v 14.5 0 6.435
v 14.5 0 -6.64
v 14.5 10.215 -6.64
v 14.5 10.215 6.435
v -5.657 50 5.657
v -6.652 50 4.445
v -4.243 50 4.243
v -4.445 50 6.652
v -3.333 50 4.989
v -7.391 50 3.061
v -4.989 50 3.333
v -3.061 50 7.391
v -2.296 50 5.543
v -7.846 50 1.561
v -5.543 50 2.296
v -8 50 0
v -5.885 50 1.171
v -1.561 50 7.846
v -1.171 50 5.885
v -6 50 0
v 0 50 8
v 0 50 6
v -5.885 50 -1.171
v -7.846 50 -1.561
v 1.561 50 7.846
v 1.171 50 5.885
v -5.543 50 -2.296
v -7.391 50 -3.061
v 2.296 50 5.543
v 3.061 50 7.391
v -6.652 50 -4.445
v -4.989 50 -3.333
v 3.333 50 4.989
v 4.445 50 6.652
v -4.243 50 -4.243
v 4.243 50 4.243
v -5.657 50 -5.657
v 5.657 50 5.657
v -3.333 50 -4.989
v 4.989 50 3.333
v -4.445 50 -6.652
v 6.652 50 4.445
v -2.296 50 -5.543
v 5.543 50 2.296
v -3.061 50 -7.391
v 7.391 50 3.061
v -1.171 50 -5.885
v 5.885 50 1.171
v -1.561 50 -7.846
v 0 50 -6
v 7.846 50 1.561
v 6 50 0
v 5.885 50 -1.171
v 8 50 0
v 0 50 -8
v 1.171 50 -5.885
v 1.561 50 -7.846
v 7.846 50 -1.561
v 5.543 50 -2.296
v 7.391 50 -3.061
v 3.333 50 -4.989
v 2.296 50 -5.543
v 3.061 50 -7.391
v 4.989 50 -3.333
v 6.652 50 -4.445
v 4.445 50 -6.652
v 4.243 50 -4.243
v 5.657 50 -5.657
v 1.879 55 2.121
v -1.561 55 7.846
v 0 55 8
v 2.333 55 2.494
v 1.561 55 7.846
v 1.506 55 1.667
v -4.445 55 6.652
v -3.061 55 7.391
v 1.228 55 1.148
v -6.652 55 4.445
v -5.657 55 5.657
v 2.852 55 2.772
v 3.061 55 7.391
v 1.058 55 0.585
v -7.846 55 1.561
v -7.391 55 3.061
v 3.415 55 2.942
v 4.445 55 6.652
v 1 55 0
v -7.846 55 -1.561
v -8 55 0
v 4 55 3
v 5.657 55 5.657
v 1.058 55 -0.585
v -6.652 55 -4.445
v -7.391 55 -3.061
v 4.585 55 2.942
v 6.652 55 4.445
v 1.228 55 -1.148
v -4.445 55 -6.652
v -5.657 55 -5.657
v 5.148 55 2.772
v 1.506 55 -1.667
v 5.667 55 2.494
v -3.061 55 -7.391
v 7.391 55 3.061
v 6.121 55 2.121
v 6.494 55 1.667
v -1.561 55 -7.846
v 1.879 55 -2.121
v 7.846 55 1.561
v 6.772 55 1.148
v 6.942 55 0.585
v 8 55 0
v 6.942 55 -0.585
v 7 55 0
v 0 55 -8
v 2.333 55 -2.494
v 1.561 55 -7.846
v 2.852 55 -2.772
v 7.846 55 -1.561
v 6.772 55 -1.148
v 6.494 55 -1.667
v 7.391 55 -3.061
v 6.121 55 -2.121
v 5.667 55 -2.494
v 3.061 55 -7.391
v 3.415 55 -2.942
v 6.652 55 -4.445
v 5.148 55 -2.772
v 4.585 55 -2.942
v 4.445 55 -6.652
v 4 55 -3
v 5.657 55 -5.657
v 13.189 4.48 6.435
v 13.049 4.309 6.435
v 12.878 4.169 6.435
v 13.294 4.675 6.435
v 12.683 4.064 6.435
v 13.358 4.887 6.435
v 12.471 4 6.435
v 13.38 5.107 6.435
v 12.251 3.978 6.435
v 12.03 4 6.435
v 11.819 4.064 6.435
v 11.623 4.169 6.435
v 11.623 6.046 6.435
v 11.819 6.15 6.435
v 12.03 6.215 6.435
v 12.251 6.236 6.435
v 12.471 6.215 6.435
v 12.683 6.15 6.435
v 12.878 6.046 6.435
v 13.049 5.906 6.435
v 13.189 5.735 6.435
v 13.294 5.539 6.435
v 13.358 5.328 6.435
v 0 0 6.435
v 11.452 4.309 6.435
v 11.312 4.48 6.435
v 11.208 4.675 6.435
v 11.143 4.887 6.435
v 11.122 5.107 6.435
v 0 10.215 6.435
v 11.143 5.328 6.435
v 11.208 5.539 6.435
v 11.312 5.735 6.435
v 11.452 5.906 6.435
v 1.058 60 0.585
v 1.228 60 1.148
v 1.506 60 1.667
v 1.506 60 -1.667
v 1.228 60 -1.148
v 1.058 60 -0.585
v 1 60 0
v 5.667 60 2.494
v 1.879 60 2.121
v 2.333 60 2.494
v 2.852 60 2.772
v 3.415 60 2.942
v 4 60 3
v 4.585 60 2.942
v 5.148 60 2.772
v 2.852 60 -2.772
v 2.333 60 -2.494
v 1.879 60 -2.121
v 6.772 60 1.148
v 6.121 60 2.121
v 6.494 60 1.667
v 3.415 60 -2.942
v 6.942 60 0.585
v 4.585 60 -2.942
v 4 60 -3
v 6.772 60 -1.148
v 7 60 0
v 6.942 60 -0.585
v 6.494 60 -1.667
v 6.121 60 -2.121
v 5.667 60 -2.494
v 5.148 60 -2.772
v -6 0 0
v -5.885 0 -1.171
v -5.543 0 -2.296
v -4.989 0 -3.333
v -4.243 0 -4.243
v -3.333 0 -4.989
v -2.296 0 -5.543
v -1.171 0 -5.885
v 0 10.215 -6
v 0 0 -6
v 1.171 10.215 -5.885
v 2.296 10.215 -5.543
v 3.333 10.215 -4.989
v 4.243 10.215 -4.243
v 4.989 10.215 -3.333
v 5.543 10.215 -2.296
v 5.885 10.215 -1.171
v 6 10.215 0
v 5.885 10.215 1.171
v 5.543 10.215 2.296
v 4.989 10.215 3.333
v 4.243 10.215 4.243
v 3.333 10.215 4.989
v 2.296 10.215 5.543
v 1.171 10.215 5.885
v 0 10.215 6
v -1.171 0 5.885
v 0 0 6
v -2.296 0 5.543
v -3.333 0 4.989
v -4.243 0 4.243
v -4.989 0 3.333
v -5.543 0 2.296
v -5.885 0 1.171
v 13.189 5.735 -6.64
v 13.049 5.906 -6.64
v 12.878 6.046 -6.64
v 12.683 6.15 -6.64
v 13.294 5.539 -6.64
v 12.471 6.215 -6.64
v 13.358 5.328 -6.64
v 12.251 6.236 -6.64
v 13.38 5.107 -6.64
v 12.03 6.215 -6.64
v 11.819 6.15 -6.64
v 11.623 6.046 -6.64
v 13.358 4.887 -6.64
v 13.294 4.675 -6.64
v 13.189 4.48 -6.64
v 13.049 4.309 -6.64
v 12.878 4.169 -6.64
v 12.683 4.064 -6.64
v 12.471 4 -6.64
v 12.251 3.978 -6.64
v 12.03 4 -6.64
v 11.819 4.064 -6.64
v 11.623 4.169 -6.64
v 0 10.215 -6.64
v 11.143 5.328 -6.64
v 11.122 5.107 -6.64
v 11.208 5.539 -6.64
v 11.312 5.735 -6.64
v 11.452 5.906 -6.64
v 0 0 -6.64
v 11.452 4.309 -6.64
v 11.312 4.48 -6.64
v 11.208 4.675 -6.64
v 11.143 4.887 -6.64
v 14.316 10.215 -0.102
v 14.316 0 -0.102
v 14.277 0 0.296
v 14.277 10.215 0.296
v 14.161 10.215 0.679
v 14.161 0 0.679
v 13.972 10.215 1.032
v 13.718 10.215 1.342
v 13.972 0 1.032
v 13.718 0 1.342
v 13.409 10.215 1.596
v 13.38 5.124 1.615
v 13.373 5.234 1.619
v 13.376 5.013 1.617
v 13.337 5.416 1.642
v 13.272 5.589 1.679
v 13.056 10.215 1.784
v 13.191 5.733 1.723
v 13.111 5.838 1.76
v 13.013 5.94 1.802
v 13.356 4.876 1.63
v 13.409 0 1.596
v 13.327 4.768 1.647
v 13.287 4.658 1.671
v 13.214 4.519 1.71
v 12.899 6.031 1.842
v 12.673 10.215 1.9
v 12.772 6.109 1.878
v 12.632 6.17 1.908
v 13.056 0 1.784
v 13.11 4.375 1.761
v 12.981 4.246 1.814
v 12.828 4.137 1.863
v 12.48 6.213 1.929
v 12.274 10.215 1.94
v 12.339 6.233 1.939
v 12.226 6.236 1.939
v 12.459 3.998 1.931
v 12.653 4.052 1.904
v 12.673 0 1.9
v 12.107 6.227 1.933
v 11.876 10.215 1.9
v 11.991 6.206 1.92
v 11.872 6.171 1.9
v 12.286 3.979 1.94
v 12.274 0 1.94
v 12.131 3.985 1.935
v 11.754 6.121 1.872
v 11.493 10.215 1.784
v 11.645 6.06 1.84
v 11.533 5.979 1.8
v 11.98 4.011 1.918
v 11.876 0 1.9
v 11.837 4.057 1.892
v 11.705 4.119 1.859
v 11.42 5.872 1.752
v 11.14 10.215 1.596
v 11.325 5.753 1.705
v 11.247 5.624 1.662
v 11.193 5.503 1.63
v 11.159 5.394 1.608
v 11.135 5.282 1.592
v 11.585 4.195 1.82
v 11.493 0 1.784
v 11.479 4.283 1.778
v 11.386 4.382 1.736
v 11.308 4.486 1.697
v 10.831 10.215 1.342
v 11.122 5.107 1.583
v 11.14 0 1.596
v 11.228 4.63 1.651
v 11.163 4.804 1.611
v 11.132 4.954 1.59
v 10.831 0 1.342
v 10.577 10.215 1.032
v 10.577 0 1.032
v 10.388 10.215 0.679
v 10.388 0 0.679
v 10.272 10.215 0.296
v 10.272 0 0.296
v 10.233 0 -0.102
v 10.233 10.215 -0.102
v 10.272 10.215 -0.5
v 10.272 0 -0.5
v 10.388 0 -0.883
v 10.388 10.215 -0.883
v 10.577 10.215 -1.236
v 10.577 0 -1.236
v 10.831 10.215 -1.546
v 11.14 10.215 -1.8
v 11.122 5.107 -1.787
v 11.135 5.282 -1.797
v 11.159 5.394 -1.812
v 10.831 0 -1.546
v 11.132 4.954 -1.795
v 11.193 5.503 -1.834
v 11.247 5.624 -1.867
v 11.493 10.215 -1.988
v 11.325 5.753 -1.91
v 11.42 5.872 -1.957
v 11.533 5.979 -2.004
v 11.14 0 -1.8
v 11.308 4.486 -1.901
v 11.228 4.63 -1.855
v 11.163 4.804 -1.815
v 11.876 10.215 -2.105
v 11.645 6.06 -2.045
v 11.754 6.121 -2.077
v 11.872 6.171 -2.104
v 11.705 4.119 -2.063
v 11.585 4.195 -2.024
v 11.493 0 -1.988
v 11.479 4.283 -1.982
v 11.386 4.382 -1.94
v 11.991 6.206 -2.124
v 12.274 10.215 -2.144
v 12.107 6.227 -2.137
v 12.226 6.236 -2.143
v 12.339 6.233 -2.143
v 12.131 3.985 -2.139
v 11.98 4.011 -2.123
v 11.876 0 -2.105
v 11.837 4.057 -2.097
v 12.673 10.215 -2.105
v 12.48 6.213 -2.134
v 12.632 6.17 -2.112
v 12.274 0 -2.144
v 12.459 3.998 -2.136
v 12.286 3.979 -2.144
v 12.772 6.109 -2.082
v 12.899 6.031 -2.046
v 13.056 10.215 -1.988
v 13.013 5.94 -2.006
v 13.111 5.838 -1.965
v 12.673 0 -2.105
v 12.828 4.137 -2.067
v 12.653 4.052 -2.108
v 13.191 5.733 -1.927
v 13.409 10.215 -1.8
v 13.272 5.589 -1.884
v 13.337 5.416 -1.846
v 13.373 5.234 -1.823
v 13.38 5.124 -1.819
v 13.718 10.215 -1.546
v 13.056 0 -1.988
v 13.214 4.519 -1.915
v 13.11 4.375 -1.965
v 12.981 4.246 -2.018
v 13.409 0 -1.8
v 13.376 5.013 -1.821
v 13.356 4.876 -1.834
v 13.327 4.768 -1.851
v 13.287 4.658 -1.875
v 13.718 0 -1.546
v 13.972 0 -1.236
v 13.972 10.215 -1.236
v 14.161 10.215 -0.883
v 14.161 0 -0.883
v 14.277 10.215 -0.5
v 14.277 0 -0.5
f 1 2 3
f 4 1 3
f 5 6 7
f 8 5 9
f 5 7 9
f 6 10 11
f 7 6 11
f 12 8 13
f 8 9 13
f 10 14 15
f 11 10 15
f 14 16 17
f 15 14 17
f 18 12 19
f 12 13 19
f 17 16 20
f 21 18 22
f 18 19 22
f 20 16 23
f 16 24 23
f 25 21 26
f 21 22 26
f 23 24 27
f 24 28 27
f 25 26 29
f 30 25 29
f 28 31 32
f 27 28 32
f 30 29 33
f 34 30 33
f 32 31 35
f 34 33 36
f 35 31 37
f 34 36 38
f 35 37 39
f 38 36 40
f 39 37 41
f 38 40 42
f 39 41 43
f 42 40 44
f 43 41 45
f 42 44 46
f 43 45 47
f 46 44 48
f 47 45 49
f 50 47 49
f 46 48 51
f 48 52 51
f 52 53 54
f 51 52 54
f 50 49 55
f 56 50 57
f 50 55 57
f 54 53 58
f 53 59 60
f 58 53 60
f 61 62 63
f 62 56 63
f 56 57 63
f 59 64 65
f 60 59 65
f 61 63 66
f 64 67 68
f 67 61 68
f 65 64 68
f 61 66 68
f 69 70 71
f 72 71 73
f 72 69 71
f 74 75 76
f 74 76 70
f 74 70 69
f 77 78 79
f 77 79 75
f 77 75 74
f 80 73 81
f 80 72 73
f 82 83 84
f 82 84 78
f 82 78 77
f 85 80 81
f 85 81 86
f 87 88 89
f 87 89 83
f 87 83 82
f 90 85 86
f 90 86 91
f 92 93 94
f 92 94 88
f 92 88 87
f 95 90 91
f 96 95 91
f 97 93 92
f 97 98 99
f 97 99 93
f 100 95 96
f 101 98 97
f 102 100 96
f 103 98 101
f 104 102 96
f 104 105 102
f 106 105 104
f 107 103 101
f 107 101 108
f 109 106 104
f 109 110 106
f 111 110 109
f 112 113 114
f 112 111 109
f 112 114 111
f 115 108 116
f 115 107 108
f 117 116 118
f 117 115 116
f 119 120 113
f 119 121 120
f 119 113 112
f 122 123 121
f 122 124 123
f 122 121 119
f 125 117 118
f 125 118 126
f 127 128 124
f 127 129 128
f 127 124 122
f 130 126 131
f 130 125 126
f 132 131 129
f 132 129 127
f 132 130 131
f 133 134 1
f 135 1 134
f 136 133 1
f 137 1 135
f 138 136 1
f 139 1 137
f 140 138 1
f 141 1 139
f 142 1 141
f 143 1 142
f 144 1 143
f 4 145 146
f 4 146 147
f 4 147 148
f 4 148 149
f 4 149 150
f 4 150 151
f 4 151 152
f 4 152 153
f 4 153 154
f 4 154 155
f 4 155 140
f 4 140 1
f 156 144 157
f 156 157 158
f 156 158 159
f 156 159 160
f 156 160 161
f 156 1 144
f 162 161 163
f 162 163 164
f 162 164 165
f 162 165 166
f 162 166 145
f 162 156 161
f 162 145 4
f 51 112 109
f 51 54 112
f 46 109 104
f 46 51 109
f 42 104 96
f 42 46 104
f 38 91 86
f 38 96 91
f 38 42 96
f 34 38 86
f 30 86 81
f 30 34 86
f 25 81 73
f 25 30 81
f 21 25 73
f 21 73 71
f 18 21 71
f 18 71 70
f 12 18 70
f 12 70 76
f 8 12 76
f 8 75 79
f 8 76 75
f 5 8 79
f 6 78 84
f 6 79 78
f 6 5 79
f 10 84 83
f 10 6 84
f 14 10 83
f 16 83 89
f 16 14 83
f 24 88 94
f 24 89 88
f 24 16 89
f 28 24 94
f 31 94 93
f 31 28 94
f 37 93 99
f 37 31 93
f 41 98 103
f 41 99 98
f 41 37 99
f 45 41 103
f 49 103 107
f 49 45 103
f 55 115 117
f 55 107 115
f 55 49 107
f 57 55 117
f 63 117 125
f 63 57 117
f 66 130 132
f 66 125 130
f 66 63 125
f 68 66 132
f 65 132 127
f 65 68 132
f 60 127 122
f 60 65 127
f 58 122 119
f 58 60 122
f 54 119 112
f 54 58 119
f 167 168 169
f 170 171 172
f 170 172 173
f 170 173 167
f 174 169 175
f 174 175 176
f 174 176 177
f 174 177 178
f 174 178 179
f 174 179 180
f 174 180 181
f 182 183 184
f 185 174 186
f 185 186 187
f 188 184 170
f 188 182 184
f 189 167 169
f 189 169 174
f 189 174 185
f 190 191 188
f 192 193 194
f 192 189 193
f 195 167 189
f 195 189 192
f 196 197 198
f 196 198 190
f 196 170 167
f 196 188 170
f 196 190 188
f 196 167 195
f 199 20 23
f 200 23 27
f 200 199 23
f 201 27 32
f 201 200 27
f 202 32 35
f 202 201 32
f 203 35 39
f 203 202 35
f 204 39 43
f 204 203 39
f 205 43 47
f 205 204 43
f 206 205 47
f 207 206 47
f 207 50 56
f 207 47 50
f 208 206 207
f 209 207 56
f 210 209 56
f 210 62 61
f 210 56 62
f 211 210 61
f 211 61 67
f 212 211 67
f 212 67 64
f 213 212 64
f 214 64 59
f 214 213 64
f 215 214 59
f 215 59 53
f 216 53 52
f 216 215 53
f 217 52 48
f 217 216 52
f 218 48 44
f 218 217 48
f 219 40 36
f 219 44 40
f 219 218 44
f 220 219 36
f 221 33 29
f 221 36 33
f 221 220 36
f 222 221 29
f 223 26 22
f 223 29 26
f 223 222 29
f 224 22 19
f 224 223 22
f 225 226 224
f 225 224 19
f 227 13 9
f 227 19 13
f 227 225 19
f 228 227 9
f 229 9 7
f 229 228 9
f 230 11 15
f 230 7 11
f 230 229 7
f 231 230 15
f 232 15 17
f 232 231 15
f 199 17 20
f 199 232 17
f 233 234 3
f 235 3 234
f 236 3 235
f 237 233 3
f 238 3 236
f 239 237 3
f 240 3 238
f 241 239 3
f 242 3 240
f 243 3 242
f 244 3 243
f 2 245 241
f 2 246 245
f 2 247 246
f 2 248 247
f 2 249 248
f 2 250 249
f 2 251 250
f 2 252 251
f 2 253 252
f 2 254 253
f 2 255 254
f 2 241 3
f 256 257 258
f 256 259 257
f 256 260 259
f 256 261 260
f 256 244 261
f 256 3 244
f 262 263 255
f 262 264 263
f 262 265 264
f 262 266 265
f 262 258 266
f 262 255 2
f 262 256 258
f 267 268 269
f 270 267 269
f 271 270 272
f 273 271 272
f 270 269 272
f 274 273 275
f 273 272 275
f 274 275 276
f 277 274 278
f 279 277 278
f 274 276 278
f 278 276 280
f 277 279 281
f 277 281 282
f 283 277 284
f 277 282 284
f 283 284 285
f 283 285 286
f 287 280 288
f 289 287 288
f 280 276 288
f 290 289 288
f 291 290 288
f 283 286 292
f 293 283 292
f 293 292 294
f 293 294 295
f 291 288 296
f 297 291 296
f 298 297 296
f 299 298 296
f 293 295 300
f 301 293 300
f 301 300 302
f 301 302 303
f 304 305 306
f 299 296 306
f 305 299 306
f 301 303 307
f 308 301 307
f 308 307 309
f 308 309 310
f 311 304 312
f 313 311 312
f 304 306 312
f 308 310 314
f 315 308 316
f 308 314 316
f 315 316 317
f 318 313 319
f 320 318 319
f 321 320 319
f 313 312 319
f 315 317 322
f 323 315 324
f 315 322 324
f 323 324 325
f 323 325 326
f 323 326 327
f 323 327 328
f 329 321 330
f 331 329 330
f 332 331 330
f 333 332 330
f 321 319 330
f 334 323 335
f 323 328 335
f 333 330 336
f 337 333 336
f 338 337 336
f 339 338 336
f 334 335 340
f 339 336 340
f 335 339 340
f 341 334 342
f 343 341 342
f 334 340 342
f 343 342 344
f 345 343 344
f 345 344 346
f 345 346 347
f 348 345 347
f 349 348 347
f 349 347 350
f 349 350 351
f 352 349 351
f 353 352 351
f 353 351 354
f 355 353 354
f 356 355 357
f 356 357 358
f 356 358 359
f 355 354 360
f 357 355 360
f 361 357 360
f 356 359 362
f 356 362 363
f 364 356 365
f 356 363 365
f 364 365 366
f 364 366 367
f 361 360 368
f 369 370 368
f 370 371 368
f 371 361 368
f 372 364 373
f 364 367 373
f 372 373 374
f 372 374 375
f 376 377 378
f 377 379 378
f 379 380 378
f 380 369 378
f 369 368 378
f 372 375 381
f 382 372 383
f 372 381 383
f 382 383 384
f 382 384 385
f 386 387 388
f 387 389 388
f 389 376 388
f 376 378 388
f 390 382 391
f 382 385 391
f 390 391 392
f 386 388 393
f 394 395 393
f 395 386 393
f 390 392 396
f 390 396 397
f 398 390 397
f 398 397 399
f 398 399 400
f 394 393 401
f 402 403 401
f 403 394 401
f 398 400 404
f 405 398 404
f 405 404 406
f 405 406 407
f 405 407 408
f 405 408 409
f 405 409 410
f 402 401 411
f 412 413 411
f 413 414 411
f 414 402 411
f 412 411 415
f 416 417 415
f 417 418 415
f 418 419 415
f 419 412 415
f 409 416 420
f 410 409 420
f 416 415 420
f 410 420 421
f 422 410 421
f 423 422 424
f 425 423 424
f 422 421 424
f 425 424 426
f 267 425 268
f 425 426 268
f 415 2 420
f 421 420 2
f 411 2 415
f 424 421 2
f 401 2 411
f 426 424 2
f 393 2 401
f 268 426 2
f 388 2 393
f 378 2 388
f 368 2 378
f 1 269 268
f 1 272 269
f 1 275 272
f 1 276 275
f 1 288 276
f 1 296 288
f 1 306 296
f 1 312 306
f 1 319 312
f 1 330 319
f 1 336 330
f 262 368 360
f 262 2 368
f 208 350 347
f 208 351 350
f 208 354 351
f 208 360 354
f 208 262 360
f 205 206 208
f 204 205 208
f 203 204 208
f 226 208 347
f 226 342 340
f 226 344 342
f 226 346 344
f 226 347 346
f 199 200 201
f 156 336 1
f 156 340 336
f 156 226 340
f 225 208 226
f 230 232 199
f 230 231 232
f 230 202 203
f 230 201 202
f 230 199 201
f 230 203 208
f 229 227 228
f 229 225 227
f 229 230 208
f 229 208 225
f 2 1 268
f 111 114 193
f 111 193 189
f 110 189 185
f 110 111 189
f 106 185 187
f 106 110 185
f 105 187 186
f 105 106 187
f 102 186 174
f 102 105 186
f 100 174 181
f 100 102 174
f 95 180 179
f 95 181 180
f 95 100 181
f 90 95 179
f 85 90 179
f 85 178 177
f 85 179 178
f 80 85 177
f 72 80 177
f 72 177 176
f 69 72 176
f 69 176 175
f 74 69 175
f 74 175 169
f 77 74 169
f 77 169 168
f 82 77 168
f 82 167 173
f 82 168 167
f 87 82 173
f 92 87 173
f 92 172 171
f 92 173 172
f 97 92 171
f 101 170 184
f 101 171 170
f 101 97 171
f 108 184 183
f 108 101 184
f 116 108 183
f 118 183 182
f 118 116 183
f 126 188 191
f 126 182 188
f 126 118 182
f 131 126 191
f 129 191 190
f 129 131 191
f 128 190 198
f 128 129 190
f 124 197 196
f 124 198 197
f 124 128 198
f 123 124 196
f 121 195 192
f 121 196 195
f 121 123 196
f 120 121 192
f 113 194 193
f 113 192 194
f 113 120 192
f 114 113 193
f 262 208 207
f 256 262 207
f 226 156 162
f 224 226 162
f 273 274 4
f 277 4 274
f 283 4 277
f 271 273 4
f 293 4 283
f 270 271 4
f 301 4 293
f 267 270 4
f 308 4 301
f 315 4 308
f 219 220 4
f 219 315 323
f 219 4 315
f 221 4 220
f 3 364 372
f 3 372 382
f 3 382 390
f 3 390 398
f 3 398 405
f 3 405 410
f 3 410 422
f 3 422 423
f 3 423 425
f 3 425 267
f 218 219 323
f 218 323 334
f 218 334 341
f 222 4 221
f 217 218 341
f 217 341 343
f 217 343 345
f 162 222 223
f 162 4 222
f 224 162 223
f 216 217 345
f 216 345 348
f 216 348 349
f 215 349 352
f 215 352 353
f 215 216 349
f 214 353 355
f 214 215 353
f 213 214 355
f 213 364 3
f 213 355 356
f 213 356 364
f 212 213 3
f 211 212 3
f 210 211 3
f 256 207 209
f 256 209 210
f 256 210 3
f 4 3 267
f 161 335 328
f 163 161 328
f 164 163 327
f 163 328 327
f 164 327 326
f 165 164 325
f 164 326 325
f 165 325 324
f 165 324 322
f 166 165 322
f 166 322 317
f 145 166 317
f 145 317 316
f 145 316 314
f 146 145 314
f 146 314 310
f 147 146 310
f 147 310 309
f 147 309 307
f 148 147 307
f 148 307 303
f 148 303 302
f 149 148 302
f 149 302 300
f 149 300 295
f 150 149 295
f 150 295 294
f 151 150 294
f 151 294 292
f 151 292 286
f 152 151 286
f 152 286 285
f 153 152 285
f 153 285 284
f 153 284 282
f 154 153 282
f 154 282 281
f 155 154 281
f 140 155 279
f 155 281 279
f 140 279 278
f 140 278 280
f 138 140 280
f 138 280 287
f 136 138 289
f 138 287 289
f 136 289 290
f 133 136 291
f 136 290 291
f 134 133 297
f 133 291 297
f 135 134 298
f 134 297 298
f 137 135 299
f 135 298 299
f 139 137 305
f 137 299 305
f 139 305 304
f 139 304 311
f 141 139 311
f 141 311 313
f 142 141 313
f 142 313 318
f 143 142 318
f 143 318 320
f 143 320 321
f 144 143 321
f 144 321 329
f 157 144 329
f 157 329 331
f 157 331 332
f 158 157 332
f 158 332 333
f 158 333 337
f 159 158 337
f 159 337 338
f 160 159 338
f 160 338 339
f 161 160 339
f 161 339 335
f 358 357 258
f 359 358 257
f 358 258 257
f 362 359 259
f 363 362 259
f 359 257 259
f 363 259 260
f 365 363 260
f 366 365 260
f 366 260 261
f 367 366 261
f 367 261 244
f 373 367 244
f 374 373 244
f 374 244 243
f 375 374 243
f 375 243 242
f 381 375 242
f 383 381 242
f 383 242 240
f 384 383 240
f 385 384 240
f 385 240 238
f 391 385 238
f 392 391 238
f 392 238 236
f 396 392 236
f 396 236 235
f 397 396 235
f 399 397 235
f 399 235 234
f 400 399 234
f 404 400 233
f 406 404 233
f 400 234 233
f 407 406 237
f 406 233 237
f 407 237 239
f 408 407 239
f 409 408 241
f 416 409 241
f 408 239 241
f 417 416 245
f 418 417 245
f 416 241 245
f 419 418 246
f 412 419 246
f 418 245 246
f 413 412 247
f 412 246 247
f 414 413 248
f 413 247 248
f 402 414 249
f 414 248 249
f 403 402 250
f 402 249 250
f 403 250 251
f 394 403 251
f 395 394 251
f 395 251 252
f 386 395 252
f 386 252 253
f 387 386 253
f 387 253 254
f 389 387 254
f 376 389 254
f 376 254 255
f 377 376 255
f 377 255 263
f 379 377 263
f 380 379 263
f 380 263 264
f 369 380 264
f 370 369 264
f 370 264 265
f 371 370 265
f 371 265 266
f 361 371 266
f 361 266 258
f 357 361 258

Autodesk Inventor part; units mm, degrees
ref_plane "YZ Plane" through (0, 0, 0) normal (1, 0, 0) x (0, 1, 0)
ref_plane "XZ Plane" through (0, 0, 0) normal (0, 1, 0) x (-1, 0, 0)
ref_plane "XY Plane" through (0, 0, 0) normal (0, 0, 1) x (1, 0, 0)
sketch "Эскиз1" plane through (0, 0, 0) normal (0, 1, 0) x (-1, 0, 0)
  circle A0 centre (0, 0) radius 6
  dimension "d0" = 12
extrude "Выдавливание1" add sketch "Эскиз1" along normal blind 50
sketch "Эскиз2" plane through (0, 50, 0) normal (0, 1, 0) x (1, 0, 0)
  circle A0 centre (0, 0) radius 8
  dimension "d3" = 16
extrude "Выдавливание2" add sketch "Эскиз2" along normal blind 5
sketch "Эскиз3" plane through (0, 55, 0) normal (0, 1, 0) x (1, 0, 0)
  circle A0 centre (0, 0) radius 8 projected
  circle A1 centre (4, 0) radius 3
  dimension "d6" = 6
  dimension "d7" = 4
extrude "Выдавливание3" add sketch "Эскиз3" along normal blind 5 contours A1
sketch "Эскиз4" plane through (0, 0, 0) normal (1, 0, 0) x (0, 1, 0)
  line L0 (0, 6.4352) -> (10.2146, 6.4352)
  line L1 (10.2146, 6.4352) -> (10.2146, -6.6395)
  line L2 (10.2146, -6.6395) -> (0, -6.6395)
  line L3 (0, -6.6395) -> (0, 6.4352)
  point P0 (0, 0)
extrude "Выдавливание4" add sketch "Эскиз4" along normal blind 14.5
sketch "Эскиз7" plane through (0, 0, 0) normal (0, -1, 0) x (1, 0, 0)
  circle A0 centre (12.2744, -0.1021) radius 2.0418
extrude "Выдавливание7" cut sketch "Эскиз7" against normal blind 14.5
sketch "Эскиз8" plane through (0, 0, -6.6395) normal (0, 0, -1) x (-1, 0, 0)
  circle A0 centre (-12.2507, 5.1073) radius 1.129
extrude "Выдавливание8" cut sketch "Эскиз8" against normal blind 14.5
properties part number "ось"
